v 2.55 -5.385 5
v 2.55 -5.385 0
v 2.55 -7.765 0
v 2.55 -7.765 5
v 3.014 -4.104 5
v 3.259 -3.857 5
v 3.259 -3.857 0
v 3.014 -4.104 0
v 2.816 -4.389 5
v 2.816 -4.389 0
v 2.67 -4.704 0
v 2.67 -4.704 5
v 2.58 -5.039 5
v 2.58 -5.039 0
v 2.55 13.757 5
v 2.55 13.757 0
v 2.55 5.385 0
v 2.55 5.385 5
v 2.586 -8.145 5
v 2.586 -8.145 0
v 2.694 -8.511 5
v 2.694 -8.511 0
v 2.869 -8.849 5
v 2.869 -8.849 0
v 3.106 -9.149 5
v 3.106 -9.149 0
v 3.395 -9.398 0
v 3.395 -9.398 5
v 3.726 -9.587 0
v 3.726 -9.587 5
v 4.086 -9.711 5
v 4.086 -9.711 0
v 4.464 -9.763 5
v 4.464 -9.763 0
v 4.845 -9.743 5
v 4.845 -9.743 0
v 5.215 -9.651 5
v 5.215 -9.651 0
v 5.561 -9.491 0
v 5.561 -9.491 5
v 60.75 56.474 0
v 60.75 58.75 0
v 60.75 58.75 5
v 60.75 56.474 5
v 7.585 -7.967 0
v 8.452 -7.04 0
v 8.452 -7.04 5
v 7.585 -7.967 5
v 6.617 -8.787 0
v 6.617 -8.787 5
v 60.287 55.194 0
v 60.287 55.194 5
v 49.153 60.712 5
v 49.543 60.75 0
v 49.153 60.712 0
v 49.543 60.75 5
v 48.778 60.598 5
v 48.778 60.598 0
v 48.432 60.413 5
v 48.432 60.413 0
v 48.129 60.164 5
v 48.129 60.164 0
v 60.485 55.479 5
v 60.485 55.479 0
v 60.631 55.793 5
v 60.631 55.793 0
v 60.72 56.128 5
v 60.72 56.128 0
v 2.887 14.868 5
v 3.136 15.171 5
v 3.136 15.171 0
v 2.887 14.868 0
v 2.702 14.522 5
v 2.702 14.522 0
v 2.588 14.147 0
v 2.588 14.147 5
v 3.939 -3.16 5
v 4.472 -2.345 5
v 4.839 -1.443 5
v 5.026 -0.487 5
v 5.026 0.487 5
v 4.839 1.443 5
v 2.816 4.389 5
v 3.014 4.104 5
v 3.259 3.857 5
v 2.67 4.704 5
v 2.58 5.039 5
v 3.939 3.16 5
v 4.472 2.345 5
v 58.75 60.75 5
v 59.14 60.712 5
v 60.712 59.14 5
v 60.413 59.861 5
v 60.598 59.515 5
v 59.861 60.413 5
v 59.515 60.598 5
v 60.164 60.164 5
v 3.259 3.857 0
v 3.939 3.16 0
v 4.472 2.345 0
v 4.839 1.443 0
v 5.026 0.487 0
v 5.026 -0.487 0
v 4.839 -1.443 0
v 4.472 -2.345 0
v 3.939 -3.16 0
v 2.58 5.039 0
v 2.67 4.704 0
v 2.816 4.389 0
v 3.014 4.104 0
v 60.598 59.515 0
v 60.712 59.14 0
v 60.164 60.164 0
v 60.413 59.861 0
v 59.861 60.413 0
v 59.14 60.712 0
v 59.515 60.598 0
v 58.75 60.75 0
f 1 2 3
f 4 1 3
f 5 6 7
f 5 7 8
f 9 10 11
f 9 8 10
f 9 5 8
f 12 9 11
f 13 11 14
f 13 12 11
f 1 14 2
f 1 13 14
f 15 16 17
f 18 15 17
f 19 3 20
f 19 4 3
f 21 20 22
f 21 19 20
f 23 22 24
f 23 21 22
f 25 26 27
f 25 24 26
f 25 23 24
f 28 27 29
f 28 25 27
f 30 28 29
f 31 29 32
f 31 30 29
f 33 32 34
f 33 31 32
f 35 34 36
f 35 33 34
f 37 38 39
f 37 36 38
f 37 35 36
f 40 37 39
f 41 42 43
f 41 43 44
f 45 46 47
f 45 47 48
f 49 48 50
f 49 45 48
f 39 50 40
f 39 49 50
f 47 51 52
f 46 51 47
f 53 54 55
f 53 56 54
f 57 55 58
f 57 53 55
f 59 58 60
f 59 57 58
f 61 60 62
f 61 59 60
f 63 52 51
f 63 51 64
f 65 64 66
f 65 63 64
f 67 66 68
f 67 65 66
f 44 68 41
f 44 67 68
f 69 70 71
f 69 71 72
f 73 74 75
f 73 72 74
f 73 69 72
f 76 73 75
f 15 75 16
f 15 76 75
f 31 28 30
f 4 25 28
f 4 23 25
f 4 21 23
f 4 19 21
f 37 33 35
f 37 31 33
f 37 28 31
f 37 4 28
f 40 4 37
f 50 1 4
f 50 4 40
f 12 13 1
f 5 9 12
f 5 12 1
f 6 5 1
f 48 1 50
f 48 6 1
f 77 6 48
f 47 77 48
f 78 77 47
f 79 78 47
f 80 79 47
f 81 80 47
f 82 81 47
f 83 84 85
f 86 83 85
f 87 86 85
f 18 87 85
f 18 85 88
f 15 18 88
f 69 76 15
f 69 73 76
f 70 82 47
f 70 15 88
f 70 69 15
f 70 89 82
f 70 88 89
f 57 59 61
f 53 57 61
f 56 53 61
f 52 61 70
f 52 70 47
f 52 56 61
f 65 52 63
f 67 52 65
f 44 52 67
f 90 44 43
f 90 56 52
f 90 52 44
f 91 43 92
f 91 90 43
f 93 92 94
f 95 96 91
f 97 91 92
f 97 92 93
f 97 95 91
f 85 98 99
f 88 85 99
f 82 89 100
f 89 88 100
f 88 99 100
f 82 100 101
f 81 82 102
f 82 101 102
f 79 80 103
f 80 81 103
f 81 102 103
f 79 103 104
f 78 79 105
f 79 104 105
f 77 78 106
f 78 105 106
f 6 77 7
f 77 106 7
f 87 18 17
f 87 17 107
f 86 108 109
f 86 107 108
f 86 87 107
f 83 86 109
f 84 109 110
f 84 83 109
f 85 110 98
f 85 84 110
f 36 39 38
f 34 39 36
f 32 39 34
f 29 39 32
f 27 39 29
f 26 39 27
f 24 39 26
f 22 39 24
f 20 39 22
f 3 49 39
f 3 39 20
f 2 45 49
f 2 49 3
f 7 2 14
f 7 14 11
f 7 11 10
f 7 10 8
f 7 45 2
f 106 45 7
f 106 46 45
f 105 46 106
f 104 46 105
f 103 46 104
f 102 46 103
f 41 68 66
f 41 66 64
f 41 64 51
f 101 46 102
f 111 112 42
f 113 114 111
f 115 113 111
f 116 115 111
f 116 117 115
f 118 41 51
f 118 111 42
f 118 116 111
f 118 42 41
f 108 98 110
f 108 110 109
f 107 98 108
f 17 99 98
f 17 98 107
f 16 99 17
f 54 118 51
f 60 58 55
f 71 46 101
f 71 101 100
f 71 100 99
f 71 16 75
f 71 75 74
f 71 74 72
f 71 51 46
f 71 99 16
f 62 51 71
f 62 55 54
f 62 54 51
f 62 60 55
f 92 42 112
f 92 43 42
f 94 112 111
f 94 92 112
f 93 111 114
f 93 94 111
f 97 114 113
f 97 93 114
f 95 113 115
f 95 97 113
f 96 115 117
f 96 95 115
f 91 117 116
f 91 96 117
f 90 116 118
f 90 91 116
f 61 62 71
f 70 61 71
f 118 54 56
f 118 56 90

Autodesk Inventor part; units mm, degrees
ref_plane "YZ Plane" through (0, 0, 0) normal (1, 0, 0) x (0, 1, 0)
ref_plane "XZ Plane" through (0, 0, 0) normal (0, 1, 0) x (-1, 0, 0)
ref_plane "XY Plane" through (0, 0, 0) normal (0, 0, 1) x (1, 0, 0)
sketch "スケッチ1" plane through (0, 0, 0) normal (0, 0, 1) x (1, 0, 0)
  circle A0 centre (0, 0) radius 11 construction
  circle A1 centre (0, 8.5) radius 1.35
  circle A2 centre (0, 8.5) radius 2.5 construction
  circle A3 centre (0, 0) radius 5.05 construction
  circle A4 centre (0, -8.5) radius 1.35
  line L0 (48.7145, 60.75) -> (2.55, 14.5855)
  line L1 (0, 0) -> (0, 48.2635) construction
  line L2 (60.75, 60.75) -> (0, 0) construction
  line L3 (48.7145, 60.75) -> (60.75, 60.75)
  line L4 (60.75, 60.75) -> (60.75, 55.75)
  arc A5 (2.55, -10.7004) -> (8.4522, -7.0399) centre (0, 0) ccw
  line L5 (60.75, 55.75) -> (8.4522, -7.0399)
  circle A6 centre (0, 0) radius 8.5 construction
  circle A7 centre (8.5, 0) radius 1.35
  line L6 (2.55, 14.5855) -> (2.55, 4.3589)
  arc A8 (2.55, -4.3589) -> (2.55, 4.3589) centre (0, 0) ccw
  line L7 (2.55, -4.3589) -> (2.55, -10.7004)
  dimension "d3" = 10.1
  dimension "d0" = 2.7
  dimension "d1" = 8.5
  dimension "d2" = 5
  dimension "d6" = 360
  dimension "d11" = 45
  dimension "d13" = 60.75
  dimension "d17" = 5
  dimension "d18" = 2.55
extrude "押し出し1" add sketch "スケッチ1" along normal blind 5 contours L3 L4 L5 A5 L7 A8 L6 L0
fillet "フィレット1" radius 2 7 edges at (2.55, -10.7004, 2.5) (2.55, -4.3589, 2.5) (2.55, 14.5855, 2.5) (60.75, 60.75, 2.5) (60.75, 55.75, 2.5) (48.7145, 60.75, 2.5) (2.55, 4.3589, 2.5)
sketch "スケッチ3" plane through (0, 0, 0) normal (0, 0, -1) x (-1, 0, 0)
  circle A0 centre (-8.5, 0) radius 1.35 projected
  circle A1 centre (-8.5, 0) radius 1.35
  point P0 (0, 0)
extrude "押し出し3" add sketch "スケッチ3" against normal up to surface (5 mm away) from surface at 0
ref_plane "作業平面1" through (0, 0, 4) normal (0, 0, -1) x (-1, 0, 0)
sketch "スケッチ4" plane through (0, 0, 4) normal (0, 0, -1) x (-1, 0, 0)
  point P0 (0, 0)
properties part number "頭_サブフレーム_1_1" material "アセタール樹脂、黒"
